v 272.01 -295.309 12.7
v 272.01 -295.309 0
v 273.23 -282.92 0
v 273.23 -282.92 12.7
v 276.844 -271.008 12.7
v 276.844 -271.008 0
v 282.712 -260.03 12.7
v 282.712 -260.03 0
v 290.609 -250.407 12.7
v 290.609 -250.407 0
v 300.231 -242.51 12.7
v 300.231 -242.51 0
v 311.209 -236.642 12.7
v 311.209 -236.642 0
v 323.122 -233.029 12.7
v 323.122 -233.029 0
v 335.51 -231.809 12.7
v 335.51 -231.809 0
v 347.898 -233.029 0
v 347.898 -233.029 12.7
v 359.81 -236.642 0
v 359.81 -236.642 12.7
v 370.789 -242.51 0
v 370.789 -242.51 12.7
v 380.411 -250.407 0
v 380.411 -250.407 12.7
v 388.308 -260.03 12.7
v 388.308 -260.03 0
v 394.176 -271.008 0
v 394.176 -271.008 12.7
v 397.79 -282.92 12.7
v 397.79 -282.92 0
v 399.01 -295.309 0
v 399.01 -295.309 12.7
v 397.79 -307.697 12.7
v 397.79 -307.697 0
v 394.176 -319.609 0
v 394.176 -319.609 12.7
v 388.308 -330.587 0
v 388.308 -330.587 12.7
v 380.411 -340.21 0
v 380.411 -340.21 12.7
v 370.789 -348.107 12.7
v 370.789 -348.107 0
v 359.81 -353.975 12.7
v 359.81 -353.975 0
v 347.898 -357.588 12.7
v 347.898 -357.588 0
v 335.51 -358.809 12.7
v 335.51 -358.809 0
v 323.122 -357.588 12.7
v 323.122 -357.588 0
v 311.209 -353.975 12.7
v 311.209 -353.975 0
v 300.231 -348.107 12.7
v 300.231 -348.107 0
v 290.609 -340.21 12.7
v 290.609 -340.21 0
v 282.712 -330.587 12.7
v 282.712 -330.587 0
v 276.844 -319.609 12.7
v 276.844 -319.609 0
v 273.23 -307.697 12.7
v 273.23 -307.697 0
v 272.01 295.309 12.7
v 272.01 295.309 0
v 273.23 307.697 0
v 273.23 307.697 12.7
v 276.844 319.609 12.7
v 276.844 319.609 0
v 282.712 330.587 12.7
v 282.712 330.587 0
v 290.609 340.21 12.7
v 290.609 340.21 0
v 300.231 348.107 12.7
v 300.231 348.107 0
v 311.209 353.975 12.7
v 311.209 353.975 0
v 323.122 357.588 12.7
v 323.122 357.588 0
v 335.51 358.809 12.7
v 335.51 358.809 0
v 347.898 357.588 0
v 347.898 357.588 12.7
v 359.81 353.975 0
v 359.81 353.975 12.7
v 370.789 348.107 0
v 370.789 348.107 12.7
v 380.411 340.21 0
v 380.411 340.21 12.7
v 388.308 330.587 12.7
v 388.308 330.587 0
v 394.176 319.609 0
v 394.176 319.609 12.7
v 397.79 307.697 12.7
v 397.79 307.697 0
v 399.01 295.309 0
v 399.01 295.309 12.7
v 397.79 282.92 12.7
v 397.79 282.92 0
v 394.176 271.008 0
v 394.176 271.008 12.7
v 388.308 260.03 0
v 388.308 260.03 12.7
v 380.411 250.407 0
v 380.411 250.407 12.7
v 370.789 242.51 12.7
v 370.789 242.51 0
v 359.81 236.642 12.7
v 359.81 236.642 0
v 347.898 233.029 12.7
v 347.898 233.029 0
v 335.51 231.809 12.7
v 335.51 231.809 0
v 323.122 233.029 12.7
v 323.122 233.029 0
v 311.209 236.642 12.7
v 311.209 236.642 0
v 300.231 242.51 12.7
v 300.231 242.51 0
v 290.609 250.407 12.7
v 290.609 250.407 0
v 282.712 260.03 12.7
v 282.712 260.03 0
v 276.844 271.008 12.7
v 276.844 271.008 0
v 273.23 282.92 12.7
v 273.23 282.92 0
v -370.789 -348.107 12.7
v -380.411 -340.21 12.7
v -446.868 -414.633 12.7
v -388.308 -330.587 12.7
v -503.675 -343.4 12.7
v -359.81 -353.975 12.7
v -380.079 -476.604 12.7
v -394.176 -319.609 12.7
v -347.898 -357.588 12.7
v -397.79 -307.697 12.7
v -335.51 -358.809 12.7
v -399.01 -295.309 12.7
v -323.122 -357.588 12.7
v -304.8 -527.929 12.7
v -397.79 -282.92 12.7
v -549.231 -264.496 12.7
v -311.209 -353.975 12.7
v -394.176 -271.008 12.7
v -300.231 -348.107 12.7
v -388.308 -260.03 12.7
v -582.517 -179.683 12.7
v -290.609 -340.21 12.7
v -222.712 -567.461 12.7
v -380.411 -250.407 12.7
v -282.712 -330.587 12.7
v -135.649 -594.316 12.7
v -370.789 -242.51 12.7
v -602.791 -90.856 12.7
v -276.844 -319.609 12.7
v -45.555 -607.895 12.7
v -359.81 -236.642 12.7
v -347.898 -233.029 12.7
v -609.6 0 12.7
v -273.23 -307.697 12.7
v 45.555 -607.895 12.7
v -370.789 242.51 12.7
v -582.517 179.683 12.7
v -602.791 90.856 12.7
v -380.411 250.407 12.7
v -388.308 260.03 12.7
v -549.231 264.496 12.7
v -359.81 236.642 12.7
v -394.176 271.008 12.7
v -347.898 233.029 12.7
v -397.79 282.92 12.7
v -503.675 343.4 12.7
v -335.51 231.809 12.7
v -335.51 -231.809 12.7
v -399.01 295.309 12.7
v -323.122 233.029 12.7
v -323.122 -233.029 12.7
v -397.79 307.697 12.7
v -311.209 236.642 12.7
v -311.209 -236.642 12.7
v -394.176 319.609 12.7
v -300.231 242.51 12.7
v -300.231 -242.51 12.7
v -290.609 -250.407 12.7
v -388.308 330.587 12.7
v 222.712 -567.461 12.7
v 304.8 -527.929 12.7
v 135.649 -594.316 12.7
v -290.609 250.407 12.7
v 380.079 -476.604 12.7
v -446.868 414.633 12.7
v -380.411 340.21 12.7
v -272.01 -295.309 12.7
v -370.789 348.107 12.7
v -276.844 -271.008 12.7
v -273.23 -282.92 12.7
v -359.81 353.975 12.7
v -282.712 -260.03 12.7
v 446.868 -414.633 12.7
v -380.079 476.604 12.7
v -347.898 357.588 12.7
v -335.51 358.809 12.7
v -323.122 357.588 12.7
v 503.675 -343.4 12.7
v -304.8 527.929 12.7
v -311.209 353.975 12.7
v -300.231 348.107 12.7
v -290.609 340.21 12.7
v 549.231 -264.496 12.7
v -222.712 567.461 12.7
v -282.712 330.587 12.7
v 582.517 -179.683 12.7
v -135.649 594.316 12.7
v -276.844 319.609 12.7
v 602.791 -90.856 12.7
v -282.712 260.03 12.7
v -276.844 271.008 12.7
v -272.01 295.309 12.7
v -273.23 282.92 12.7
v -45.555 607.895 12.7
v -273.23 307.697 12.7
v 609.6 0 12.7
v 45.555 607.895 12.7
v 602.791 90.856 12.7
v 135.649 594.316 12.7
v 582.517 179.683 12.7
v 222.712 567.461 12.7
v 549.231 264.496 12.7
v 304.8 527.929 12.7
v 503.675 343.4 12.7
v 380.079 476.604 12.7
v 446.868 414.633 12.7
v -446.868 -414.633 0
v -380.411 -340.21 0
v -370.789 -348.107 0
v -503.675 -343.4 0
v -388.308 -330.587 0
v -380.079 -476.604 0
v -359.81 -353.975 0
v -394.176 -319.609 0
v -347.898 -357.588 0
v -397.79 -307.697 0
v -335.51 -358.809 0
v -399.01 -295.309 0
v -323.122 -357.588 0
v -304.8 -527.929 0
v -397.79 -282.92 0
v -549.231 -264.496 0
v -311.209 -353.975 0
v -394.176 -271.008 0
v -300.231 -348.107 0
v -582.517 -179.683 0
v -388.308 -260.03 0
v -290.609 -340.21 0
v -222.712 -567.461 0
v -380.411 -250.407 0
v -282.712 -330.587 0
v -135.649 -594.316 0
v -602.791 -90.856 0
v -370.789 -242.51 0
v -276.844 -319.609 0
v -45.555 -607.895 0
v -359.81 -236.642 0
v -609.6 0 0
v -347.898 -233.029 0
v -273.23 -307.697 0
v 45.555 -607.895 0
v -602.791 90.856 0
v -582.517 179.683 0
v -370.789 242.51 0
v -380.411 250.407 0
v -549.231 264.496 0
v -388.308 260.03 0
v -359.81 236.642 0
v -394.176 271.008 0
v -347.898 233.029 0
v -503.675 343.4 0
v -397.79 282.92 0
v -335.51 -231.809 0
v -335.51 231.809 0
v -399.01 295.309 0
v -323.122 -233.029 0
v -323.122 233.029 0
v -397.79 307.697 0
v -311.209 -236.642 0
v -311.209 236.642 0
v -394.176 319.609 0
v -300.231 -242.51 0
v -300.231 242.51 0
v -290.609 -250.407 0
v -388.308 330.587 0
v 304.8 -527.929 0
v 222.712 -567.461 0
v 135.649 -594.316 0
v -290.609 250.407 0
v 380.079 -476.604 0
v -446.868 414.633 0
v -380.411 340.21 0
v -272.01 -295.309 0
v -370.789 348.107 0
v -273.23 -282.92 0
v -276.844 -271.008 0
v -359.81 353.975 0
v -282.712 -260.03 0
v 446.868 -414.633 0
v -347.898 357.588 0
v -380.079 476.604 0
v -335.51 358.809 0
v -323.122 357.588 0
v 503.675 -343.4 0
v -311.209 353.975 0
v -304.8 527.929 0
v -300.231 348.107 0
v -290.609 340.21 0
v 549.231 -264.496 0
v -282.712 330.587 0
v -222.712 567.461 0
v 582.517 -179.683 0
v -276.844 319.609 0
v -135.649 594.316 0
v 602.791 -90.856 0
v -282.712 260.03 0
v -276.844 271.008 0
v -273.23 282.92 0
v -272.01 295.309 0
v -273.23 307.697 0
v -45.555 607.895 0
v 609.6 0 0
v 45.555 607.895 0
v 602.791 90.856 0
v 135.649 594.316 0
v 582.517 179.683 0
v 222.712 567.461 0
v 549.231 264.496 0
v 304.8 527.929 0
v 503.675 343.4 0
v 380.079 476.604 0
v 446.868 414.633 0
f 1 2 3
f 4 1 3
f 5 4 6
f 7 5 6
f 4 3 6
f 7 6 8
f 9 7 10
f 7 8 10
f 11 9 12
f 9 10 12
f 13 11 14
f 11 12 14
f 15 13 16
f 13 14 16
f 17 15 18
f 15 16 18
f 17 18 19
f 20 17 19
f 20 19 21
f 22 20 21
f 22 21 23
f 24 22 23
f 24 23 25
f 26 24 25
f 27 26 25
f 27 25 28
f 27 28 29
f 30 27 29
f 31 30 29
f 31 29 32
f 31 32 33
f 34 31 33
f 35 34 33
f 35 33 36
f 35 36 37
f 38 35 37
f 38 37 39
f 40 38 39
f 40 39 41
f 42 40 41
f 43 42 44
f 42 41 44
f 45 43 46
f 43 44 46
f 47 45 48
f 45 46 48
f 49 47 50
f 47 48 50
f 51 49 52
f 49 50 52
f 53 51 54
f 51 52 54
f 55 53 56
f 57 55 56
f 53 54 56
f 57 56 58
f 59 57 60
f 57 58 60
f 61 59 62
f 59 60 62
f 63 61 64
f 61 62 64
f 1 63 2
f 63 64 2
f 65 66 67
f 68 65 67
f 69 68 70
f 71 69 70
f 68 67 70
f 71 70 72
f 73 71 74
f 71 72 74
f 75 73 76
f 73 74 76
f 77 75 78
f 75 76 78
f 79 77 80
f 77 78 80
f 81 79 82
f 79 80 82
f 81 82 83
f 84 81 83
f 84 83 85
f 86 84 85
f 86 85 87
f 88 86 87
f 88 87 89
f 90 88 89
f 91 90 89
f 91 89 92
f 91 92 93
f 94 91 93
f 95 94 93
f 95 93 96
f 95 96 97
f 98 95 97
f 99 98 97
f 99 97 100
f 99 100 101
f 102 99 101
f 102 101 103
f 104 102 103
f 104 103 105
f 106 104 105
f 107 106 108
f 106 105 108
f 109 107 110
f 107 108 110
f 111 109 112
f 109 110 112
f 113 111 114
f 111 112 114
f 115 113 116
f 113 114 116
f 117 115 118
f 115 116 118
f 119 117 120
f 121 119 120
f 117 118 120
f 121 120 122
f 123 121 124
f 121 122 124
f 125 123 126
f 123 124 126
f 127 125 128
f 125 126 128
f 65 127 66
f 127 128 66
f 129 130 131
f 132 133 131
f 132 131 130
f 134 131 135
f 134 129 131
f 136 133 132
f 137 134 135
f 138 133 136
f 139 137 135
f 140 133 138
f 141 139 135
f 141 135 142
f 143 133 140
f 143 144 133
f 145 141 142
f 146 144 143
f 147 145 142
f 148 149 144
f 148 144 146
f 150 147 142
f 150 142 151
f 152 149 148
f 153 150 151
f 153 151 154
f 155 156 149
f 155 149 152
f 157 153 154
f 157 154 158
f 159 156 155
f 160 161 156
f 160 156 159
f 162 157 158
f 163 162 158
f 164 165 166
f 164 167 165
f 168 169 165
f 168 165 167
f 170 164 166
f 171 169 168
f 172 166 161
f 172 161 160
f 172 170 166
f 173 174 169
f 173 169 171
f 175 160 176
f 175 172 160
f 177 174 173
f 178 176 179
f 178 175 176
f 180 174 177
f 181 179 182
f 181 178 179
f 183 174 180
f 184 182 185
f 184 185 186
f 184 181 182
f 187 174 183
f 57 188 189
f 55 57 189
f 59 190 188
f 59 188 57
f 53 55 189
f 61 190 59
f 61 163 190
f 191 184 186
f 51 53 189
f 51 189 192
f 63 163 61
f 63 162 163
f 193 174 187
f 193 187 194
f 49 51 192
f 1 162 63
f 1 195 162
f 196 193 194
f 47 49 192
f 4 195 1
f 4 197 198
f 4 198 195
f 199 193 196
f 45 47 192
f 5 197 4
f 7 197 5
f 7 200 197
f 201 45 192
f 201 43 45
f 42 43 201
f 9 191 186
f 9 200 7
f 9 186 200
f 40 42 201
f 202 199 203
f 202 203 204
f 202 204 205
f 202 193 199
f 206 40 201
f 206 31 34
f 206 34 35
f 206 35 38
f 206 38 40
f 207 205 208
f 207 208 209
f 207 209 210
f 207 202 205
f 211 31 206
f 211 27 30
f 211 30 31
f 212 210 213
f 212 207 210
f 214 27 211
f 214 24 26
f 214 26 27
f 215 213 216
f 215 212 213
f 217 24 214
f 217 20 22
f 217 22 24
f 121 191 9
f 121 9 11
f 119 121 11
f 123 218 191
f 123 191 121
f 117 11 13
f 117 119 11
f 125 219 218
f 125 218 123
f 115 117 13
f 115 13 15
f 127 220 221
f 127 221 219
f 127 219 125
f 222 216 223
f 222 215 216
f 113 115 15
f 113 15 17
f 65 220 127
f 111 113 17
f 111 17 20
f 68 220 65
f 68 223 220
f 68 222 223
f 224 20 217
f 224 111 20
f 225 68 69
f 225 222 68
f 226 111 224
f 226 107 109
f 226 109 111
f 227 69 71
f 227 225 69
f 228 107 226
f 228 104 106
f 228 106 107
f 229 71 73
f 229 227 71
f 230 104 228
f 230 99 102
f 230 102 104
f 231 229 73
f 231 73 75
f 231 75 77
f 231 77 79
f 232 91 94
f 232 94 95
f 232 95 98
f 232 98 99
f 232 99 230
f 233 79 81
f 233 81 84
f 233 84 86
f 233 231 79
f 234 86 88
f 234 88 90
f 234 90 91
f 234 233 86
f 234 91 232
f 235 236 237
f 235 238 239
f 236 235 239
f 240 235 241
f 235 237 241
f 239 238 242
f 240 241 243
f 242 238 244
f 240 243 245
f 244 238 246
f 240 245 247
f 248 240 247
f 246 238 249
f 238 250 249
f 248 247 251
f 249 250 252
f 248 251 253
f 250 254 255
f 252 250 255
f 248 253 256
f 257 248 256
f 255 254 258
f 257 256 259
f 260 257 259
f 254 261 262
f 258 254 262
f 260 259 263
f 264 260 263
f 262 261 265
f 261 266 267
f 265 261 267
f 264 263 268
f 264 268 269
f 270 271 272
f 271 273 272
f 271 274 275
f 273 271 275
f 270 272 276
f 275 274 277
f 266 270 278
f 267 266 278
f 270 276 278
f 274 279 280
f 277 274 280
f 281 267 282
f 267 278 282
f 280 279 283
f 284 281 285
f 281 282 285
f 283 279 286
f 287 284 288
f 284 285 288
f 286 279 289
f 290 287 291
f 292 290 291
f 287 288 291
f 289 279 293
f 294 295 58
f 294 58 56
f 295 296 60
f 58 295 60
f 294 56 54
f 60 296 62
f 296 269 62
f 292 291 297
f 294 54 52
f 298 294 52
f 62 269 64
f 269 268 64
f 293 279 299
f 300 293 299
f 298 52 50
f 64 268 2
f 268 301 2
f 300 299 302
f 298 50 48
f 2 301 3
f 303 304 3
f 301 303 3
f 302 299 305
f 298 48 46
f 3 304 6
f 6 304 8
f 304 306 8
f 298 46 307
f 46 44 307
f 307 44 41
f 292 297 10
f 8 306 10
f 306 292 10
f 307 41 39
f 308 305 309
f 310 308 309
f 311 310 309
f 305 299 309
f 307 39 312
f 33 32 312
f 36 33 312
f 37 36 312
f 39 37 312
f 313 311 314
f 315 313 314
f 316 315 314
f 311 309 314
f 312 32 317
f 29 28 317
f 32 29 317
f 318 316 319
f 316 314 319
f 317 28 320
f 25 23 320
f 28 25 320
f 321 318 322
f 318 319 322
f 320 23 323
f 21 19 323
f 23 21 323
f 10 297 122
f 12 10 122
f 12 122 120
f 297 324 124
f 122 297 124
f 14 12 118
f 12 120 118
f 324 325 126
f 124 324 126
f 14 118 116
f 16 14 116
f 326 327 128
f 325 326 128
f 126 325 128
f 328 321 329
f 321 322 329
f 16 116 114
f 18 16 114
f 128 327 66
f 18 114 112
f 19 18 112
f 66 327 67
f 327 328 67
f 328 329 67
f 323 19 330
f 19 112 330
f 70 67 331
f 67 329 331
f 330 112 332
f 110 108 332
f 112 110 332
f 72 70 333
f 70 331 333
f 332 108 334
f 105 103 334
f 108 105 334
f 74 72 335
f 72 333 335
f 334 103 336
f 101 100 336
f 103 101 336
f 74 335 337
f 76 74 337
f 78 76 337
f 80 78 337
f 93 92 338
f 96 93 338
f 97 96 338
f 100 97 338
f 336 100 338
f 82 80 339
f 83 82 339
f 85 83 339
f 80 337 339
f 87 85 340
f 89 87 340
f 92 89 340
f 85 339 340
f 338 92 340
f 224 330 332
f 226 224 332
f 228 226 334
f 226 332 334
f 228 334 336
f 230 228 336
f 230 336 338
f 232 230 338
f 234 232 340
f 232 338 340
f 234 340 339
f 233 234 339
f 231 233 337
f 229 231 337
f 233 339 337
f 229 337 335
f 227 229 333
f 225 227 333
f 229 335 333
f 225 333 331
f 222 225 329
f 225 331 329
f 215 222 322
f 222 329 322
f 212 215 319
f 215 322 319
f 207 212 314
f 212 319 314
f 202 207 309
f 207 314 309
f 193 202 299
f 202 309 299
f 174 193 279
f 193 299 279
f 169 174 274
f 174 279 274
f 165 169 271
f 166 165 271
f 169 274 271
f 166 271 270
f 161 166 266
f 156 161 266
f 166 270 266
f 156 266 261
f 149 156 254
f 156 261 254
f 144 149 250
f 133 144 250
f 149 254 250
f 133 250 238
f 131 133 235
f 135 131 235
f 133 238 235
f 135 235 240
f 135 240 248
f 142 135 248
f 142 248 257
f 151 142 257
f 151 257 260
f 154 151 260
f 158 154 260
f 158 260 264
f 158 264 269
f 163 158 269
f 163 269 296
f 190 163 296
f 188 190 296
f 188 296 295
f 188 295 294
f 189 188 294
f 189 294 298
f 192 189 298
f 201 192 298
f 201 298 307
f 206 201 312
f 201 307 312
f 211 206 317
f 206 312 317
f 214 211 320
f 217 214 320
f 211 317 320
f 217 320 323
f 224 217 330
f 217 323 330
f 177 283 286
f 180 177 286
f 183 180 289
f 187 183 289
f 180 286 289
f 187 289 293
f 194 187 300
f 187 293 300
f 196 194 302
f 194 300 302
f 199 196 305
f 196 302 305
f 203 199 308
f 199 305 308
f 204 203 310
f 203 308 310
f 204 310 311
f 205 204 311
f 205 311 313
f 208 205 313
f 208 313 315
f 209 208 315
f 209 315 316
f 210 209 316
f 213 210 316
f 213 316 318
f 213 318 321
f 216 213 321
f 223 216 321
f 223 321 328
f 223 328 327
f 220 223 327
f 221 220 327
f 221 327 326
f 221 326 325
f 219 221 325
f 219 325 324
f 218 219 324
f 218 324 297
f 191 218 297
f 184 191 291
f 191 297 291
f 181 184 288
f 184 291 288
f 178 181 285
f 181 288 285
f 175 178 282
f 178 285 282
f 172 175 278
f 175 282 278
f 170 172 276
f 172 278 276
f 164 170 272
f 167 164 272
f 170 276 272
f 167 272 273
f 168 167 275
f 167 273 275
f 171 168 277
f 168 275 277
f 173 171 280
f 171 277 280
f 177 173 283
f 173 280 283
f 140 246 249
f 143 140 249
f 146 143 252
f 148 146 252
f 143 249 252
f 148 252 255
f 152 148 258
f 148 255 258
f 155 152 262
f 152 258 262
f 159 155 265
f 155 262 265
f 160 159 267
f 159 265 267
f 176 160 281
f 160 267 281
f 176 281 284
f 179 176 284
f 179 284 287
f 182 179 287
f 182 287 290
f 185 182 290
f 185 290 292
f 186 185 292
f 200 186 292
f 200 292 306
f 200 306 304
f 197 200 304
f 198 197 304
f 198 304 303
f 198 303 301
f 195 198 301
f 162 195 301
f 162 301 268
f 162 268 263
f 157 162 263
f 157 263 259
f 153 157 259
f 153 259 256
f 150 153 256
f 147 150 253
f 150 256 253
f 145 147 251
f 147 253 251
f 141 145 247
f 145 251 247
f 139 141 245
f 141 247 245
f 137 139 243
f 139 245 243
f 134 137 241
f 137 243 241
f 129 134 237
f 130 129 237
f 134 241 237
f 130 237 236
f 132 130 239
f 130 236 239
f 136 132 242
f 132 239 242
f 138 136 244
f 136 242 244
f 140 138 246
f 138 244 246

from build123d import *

# Parameters (mm, degrees)
F0_R     = 609.6
F1_DEPTH = 12.7
F3_D     = 127


with BuildPart() as f1:
    # F0 (on Top) → F1 (new body)
    with BuildSketch(Plane.XY):
        Circle(F0_R)
    extrude(amount=F1_DEPTH)

    # F3 (through all)
    with Locations(Plane.XY.offset(12.7)):
        with Locations((335.509866, 295.30862), (335.509866, -295.30862), (-335.509866, -295.30862), (-335.509866, 295.30862)):
            Hole(F3_D / 2)


solid = f1.part
